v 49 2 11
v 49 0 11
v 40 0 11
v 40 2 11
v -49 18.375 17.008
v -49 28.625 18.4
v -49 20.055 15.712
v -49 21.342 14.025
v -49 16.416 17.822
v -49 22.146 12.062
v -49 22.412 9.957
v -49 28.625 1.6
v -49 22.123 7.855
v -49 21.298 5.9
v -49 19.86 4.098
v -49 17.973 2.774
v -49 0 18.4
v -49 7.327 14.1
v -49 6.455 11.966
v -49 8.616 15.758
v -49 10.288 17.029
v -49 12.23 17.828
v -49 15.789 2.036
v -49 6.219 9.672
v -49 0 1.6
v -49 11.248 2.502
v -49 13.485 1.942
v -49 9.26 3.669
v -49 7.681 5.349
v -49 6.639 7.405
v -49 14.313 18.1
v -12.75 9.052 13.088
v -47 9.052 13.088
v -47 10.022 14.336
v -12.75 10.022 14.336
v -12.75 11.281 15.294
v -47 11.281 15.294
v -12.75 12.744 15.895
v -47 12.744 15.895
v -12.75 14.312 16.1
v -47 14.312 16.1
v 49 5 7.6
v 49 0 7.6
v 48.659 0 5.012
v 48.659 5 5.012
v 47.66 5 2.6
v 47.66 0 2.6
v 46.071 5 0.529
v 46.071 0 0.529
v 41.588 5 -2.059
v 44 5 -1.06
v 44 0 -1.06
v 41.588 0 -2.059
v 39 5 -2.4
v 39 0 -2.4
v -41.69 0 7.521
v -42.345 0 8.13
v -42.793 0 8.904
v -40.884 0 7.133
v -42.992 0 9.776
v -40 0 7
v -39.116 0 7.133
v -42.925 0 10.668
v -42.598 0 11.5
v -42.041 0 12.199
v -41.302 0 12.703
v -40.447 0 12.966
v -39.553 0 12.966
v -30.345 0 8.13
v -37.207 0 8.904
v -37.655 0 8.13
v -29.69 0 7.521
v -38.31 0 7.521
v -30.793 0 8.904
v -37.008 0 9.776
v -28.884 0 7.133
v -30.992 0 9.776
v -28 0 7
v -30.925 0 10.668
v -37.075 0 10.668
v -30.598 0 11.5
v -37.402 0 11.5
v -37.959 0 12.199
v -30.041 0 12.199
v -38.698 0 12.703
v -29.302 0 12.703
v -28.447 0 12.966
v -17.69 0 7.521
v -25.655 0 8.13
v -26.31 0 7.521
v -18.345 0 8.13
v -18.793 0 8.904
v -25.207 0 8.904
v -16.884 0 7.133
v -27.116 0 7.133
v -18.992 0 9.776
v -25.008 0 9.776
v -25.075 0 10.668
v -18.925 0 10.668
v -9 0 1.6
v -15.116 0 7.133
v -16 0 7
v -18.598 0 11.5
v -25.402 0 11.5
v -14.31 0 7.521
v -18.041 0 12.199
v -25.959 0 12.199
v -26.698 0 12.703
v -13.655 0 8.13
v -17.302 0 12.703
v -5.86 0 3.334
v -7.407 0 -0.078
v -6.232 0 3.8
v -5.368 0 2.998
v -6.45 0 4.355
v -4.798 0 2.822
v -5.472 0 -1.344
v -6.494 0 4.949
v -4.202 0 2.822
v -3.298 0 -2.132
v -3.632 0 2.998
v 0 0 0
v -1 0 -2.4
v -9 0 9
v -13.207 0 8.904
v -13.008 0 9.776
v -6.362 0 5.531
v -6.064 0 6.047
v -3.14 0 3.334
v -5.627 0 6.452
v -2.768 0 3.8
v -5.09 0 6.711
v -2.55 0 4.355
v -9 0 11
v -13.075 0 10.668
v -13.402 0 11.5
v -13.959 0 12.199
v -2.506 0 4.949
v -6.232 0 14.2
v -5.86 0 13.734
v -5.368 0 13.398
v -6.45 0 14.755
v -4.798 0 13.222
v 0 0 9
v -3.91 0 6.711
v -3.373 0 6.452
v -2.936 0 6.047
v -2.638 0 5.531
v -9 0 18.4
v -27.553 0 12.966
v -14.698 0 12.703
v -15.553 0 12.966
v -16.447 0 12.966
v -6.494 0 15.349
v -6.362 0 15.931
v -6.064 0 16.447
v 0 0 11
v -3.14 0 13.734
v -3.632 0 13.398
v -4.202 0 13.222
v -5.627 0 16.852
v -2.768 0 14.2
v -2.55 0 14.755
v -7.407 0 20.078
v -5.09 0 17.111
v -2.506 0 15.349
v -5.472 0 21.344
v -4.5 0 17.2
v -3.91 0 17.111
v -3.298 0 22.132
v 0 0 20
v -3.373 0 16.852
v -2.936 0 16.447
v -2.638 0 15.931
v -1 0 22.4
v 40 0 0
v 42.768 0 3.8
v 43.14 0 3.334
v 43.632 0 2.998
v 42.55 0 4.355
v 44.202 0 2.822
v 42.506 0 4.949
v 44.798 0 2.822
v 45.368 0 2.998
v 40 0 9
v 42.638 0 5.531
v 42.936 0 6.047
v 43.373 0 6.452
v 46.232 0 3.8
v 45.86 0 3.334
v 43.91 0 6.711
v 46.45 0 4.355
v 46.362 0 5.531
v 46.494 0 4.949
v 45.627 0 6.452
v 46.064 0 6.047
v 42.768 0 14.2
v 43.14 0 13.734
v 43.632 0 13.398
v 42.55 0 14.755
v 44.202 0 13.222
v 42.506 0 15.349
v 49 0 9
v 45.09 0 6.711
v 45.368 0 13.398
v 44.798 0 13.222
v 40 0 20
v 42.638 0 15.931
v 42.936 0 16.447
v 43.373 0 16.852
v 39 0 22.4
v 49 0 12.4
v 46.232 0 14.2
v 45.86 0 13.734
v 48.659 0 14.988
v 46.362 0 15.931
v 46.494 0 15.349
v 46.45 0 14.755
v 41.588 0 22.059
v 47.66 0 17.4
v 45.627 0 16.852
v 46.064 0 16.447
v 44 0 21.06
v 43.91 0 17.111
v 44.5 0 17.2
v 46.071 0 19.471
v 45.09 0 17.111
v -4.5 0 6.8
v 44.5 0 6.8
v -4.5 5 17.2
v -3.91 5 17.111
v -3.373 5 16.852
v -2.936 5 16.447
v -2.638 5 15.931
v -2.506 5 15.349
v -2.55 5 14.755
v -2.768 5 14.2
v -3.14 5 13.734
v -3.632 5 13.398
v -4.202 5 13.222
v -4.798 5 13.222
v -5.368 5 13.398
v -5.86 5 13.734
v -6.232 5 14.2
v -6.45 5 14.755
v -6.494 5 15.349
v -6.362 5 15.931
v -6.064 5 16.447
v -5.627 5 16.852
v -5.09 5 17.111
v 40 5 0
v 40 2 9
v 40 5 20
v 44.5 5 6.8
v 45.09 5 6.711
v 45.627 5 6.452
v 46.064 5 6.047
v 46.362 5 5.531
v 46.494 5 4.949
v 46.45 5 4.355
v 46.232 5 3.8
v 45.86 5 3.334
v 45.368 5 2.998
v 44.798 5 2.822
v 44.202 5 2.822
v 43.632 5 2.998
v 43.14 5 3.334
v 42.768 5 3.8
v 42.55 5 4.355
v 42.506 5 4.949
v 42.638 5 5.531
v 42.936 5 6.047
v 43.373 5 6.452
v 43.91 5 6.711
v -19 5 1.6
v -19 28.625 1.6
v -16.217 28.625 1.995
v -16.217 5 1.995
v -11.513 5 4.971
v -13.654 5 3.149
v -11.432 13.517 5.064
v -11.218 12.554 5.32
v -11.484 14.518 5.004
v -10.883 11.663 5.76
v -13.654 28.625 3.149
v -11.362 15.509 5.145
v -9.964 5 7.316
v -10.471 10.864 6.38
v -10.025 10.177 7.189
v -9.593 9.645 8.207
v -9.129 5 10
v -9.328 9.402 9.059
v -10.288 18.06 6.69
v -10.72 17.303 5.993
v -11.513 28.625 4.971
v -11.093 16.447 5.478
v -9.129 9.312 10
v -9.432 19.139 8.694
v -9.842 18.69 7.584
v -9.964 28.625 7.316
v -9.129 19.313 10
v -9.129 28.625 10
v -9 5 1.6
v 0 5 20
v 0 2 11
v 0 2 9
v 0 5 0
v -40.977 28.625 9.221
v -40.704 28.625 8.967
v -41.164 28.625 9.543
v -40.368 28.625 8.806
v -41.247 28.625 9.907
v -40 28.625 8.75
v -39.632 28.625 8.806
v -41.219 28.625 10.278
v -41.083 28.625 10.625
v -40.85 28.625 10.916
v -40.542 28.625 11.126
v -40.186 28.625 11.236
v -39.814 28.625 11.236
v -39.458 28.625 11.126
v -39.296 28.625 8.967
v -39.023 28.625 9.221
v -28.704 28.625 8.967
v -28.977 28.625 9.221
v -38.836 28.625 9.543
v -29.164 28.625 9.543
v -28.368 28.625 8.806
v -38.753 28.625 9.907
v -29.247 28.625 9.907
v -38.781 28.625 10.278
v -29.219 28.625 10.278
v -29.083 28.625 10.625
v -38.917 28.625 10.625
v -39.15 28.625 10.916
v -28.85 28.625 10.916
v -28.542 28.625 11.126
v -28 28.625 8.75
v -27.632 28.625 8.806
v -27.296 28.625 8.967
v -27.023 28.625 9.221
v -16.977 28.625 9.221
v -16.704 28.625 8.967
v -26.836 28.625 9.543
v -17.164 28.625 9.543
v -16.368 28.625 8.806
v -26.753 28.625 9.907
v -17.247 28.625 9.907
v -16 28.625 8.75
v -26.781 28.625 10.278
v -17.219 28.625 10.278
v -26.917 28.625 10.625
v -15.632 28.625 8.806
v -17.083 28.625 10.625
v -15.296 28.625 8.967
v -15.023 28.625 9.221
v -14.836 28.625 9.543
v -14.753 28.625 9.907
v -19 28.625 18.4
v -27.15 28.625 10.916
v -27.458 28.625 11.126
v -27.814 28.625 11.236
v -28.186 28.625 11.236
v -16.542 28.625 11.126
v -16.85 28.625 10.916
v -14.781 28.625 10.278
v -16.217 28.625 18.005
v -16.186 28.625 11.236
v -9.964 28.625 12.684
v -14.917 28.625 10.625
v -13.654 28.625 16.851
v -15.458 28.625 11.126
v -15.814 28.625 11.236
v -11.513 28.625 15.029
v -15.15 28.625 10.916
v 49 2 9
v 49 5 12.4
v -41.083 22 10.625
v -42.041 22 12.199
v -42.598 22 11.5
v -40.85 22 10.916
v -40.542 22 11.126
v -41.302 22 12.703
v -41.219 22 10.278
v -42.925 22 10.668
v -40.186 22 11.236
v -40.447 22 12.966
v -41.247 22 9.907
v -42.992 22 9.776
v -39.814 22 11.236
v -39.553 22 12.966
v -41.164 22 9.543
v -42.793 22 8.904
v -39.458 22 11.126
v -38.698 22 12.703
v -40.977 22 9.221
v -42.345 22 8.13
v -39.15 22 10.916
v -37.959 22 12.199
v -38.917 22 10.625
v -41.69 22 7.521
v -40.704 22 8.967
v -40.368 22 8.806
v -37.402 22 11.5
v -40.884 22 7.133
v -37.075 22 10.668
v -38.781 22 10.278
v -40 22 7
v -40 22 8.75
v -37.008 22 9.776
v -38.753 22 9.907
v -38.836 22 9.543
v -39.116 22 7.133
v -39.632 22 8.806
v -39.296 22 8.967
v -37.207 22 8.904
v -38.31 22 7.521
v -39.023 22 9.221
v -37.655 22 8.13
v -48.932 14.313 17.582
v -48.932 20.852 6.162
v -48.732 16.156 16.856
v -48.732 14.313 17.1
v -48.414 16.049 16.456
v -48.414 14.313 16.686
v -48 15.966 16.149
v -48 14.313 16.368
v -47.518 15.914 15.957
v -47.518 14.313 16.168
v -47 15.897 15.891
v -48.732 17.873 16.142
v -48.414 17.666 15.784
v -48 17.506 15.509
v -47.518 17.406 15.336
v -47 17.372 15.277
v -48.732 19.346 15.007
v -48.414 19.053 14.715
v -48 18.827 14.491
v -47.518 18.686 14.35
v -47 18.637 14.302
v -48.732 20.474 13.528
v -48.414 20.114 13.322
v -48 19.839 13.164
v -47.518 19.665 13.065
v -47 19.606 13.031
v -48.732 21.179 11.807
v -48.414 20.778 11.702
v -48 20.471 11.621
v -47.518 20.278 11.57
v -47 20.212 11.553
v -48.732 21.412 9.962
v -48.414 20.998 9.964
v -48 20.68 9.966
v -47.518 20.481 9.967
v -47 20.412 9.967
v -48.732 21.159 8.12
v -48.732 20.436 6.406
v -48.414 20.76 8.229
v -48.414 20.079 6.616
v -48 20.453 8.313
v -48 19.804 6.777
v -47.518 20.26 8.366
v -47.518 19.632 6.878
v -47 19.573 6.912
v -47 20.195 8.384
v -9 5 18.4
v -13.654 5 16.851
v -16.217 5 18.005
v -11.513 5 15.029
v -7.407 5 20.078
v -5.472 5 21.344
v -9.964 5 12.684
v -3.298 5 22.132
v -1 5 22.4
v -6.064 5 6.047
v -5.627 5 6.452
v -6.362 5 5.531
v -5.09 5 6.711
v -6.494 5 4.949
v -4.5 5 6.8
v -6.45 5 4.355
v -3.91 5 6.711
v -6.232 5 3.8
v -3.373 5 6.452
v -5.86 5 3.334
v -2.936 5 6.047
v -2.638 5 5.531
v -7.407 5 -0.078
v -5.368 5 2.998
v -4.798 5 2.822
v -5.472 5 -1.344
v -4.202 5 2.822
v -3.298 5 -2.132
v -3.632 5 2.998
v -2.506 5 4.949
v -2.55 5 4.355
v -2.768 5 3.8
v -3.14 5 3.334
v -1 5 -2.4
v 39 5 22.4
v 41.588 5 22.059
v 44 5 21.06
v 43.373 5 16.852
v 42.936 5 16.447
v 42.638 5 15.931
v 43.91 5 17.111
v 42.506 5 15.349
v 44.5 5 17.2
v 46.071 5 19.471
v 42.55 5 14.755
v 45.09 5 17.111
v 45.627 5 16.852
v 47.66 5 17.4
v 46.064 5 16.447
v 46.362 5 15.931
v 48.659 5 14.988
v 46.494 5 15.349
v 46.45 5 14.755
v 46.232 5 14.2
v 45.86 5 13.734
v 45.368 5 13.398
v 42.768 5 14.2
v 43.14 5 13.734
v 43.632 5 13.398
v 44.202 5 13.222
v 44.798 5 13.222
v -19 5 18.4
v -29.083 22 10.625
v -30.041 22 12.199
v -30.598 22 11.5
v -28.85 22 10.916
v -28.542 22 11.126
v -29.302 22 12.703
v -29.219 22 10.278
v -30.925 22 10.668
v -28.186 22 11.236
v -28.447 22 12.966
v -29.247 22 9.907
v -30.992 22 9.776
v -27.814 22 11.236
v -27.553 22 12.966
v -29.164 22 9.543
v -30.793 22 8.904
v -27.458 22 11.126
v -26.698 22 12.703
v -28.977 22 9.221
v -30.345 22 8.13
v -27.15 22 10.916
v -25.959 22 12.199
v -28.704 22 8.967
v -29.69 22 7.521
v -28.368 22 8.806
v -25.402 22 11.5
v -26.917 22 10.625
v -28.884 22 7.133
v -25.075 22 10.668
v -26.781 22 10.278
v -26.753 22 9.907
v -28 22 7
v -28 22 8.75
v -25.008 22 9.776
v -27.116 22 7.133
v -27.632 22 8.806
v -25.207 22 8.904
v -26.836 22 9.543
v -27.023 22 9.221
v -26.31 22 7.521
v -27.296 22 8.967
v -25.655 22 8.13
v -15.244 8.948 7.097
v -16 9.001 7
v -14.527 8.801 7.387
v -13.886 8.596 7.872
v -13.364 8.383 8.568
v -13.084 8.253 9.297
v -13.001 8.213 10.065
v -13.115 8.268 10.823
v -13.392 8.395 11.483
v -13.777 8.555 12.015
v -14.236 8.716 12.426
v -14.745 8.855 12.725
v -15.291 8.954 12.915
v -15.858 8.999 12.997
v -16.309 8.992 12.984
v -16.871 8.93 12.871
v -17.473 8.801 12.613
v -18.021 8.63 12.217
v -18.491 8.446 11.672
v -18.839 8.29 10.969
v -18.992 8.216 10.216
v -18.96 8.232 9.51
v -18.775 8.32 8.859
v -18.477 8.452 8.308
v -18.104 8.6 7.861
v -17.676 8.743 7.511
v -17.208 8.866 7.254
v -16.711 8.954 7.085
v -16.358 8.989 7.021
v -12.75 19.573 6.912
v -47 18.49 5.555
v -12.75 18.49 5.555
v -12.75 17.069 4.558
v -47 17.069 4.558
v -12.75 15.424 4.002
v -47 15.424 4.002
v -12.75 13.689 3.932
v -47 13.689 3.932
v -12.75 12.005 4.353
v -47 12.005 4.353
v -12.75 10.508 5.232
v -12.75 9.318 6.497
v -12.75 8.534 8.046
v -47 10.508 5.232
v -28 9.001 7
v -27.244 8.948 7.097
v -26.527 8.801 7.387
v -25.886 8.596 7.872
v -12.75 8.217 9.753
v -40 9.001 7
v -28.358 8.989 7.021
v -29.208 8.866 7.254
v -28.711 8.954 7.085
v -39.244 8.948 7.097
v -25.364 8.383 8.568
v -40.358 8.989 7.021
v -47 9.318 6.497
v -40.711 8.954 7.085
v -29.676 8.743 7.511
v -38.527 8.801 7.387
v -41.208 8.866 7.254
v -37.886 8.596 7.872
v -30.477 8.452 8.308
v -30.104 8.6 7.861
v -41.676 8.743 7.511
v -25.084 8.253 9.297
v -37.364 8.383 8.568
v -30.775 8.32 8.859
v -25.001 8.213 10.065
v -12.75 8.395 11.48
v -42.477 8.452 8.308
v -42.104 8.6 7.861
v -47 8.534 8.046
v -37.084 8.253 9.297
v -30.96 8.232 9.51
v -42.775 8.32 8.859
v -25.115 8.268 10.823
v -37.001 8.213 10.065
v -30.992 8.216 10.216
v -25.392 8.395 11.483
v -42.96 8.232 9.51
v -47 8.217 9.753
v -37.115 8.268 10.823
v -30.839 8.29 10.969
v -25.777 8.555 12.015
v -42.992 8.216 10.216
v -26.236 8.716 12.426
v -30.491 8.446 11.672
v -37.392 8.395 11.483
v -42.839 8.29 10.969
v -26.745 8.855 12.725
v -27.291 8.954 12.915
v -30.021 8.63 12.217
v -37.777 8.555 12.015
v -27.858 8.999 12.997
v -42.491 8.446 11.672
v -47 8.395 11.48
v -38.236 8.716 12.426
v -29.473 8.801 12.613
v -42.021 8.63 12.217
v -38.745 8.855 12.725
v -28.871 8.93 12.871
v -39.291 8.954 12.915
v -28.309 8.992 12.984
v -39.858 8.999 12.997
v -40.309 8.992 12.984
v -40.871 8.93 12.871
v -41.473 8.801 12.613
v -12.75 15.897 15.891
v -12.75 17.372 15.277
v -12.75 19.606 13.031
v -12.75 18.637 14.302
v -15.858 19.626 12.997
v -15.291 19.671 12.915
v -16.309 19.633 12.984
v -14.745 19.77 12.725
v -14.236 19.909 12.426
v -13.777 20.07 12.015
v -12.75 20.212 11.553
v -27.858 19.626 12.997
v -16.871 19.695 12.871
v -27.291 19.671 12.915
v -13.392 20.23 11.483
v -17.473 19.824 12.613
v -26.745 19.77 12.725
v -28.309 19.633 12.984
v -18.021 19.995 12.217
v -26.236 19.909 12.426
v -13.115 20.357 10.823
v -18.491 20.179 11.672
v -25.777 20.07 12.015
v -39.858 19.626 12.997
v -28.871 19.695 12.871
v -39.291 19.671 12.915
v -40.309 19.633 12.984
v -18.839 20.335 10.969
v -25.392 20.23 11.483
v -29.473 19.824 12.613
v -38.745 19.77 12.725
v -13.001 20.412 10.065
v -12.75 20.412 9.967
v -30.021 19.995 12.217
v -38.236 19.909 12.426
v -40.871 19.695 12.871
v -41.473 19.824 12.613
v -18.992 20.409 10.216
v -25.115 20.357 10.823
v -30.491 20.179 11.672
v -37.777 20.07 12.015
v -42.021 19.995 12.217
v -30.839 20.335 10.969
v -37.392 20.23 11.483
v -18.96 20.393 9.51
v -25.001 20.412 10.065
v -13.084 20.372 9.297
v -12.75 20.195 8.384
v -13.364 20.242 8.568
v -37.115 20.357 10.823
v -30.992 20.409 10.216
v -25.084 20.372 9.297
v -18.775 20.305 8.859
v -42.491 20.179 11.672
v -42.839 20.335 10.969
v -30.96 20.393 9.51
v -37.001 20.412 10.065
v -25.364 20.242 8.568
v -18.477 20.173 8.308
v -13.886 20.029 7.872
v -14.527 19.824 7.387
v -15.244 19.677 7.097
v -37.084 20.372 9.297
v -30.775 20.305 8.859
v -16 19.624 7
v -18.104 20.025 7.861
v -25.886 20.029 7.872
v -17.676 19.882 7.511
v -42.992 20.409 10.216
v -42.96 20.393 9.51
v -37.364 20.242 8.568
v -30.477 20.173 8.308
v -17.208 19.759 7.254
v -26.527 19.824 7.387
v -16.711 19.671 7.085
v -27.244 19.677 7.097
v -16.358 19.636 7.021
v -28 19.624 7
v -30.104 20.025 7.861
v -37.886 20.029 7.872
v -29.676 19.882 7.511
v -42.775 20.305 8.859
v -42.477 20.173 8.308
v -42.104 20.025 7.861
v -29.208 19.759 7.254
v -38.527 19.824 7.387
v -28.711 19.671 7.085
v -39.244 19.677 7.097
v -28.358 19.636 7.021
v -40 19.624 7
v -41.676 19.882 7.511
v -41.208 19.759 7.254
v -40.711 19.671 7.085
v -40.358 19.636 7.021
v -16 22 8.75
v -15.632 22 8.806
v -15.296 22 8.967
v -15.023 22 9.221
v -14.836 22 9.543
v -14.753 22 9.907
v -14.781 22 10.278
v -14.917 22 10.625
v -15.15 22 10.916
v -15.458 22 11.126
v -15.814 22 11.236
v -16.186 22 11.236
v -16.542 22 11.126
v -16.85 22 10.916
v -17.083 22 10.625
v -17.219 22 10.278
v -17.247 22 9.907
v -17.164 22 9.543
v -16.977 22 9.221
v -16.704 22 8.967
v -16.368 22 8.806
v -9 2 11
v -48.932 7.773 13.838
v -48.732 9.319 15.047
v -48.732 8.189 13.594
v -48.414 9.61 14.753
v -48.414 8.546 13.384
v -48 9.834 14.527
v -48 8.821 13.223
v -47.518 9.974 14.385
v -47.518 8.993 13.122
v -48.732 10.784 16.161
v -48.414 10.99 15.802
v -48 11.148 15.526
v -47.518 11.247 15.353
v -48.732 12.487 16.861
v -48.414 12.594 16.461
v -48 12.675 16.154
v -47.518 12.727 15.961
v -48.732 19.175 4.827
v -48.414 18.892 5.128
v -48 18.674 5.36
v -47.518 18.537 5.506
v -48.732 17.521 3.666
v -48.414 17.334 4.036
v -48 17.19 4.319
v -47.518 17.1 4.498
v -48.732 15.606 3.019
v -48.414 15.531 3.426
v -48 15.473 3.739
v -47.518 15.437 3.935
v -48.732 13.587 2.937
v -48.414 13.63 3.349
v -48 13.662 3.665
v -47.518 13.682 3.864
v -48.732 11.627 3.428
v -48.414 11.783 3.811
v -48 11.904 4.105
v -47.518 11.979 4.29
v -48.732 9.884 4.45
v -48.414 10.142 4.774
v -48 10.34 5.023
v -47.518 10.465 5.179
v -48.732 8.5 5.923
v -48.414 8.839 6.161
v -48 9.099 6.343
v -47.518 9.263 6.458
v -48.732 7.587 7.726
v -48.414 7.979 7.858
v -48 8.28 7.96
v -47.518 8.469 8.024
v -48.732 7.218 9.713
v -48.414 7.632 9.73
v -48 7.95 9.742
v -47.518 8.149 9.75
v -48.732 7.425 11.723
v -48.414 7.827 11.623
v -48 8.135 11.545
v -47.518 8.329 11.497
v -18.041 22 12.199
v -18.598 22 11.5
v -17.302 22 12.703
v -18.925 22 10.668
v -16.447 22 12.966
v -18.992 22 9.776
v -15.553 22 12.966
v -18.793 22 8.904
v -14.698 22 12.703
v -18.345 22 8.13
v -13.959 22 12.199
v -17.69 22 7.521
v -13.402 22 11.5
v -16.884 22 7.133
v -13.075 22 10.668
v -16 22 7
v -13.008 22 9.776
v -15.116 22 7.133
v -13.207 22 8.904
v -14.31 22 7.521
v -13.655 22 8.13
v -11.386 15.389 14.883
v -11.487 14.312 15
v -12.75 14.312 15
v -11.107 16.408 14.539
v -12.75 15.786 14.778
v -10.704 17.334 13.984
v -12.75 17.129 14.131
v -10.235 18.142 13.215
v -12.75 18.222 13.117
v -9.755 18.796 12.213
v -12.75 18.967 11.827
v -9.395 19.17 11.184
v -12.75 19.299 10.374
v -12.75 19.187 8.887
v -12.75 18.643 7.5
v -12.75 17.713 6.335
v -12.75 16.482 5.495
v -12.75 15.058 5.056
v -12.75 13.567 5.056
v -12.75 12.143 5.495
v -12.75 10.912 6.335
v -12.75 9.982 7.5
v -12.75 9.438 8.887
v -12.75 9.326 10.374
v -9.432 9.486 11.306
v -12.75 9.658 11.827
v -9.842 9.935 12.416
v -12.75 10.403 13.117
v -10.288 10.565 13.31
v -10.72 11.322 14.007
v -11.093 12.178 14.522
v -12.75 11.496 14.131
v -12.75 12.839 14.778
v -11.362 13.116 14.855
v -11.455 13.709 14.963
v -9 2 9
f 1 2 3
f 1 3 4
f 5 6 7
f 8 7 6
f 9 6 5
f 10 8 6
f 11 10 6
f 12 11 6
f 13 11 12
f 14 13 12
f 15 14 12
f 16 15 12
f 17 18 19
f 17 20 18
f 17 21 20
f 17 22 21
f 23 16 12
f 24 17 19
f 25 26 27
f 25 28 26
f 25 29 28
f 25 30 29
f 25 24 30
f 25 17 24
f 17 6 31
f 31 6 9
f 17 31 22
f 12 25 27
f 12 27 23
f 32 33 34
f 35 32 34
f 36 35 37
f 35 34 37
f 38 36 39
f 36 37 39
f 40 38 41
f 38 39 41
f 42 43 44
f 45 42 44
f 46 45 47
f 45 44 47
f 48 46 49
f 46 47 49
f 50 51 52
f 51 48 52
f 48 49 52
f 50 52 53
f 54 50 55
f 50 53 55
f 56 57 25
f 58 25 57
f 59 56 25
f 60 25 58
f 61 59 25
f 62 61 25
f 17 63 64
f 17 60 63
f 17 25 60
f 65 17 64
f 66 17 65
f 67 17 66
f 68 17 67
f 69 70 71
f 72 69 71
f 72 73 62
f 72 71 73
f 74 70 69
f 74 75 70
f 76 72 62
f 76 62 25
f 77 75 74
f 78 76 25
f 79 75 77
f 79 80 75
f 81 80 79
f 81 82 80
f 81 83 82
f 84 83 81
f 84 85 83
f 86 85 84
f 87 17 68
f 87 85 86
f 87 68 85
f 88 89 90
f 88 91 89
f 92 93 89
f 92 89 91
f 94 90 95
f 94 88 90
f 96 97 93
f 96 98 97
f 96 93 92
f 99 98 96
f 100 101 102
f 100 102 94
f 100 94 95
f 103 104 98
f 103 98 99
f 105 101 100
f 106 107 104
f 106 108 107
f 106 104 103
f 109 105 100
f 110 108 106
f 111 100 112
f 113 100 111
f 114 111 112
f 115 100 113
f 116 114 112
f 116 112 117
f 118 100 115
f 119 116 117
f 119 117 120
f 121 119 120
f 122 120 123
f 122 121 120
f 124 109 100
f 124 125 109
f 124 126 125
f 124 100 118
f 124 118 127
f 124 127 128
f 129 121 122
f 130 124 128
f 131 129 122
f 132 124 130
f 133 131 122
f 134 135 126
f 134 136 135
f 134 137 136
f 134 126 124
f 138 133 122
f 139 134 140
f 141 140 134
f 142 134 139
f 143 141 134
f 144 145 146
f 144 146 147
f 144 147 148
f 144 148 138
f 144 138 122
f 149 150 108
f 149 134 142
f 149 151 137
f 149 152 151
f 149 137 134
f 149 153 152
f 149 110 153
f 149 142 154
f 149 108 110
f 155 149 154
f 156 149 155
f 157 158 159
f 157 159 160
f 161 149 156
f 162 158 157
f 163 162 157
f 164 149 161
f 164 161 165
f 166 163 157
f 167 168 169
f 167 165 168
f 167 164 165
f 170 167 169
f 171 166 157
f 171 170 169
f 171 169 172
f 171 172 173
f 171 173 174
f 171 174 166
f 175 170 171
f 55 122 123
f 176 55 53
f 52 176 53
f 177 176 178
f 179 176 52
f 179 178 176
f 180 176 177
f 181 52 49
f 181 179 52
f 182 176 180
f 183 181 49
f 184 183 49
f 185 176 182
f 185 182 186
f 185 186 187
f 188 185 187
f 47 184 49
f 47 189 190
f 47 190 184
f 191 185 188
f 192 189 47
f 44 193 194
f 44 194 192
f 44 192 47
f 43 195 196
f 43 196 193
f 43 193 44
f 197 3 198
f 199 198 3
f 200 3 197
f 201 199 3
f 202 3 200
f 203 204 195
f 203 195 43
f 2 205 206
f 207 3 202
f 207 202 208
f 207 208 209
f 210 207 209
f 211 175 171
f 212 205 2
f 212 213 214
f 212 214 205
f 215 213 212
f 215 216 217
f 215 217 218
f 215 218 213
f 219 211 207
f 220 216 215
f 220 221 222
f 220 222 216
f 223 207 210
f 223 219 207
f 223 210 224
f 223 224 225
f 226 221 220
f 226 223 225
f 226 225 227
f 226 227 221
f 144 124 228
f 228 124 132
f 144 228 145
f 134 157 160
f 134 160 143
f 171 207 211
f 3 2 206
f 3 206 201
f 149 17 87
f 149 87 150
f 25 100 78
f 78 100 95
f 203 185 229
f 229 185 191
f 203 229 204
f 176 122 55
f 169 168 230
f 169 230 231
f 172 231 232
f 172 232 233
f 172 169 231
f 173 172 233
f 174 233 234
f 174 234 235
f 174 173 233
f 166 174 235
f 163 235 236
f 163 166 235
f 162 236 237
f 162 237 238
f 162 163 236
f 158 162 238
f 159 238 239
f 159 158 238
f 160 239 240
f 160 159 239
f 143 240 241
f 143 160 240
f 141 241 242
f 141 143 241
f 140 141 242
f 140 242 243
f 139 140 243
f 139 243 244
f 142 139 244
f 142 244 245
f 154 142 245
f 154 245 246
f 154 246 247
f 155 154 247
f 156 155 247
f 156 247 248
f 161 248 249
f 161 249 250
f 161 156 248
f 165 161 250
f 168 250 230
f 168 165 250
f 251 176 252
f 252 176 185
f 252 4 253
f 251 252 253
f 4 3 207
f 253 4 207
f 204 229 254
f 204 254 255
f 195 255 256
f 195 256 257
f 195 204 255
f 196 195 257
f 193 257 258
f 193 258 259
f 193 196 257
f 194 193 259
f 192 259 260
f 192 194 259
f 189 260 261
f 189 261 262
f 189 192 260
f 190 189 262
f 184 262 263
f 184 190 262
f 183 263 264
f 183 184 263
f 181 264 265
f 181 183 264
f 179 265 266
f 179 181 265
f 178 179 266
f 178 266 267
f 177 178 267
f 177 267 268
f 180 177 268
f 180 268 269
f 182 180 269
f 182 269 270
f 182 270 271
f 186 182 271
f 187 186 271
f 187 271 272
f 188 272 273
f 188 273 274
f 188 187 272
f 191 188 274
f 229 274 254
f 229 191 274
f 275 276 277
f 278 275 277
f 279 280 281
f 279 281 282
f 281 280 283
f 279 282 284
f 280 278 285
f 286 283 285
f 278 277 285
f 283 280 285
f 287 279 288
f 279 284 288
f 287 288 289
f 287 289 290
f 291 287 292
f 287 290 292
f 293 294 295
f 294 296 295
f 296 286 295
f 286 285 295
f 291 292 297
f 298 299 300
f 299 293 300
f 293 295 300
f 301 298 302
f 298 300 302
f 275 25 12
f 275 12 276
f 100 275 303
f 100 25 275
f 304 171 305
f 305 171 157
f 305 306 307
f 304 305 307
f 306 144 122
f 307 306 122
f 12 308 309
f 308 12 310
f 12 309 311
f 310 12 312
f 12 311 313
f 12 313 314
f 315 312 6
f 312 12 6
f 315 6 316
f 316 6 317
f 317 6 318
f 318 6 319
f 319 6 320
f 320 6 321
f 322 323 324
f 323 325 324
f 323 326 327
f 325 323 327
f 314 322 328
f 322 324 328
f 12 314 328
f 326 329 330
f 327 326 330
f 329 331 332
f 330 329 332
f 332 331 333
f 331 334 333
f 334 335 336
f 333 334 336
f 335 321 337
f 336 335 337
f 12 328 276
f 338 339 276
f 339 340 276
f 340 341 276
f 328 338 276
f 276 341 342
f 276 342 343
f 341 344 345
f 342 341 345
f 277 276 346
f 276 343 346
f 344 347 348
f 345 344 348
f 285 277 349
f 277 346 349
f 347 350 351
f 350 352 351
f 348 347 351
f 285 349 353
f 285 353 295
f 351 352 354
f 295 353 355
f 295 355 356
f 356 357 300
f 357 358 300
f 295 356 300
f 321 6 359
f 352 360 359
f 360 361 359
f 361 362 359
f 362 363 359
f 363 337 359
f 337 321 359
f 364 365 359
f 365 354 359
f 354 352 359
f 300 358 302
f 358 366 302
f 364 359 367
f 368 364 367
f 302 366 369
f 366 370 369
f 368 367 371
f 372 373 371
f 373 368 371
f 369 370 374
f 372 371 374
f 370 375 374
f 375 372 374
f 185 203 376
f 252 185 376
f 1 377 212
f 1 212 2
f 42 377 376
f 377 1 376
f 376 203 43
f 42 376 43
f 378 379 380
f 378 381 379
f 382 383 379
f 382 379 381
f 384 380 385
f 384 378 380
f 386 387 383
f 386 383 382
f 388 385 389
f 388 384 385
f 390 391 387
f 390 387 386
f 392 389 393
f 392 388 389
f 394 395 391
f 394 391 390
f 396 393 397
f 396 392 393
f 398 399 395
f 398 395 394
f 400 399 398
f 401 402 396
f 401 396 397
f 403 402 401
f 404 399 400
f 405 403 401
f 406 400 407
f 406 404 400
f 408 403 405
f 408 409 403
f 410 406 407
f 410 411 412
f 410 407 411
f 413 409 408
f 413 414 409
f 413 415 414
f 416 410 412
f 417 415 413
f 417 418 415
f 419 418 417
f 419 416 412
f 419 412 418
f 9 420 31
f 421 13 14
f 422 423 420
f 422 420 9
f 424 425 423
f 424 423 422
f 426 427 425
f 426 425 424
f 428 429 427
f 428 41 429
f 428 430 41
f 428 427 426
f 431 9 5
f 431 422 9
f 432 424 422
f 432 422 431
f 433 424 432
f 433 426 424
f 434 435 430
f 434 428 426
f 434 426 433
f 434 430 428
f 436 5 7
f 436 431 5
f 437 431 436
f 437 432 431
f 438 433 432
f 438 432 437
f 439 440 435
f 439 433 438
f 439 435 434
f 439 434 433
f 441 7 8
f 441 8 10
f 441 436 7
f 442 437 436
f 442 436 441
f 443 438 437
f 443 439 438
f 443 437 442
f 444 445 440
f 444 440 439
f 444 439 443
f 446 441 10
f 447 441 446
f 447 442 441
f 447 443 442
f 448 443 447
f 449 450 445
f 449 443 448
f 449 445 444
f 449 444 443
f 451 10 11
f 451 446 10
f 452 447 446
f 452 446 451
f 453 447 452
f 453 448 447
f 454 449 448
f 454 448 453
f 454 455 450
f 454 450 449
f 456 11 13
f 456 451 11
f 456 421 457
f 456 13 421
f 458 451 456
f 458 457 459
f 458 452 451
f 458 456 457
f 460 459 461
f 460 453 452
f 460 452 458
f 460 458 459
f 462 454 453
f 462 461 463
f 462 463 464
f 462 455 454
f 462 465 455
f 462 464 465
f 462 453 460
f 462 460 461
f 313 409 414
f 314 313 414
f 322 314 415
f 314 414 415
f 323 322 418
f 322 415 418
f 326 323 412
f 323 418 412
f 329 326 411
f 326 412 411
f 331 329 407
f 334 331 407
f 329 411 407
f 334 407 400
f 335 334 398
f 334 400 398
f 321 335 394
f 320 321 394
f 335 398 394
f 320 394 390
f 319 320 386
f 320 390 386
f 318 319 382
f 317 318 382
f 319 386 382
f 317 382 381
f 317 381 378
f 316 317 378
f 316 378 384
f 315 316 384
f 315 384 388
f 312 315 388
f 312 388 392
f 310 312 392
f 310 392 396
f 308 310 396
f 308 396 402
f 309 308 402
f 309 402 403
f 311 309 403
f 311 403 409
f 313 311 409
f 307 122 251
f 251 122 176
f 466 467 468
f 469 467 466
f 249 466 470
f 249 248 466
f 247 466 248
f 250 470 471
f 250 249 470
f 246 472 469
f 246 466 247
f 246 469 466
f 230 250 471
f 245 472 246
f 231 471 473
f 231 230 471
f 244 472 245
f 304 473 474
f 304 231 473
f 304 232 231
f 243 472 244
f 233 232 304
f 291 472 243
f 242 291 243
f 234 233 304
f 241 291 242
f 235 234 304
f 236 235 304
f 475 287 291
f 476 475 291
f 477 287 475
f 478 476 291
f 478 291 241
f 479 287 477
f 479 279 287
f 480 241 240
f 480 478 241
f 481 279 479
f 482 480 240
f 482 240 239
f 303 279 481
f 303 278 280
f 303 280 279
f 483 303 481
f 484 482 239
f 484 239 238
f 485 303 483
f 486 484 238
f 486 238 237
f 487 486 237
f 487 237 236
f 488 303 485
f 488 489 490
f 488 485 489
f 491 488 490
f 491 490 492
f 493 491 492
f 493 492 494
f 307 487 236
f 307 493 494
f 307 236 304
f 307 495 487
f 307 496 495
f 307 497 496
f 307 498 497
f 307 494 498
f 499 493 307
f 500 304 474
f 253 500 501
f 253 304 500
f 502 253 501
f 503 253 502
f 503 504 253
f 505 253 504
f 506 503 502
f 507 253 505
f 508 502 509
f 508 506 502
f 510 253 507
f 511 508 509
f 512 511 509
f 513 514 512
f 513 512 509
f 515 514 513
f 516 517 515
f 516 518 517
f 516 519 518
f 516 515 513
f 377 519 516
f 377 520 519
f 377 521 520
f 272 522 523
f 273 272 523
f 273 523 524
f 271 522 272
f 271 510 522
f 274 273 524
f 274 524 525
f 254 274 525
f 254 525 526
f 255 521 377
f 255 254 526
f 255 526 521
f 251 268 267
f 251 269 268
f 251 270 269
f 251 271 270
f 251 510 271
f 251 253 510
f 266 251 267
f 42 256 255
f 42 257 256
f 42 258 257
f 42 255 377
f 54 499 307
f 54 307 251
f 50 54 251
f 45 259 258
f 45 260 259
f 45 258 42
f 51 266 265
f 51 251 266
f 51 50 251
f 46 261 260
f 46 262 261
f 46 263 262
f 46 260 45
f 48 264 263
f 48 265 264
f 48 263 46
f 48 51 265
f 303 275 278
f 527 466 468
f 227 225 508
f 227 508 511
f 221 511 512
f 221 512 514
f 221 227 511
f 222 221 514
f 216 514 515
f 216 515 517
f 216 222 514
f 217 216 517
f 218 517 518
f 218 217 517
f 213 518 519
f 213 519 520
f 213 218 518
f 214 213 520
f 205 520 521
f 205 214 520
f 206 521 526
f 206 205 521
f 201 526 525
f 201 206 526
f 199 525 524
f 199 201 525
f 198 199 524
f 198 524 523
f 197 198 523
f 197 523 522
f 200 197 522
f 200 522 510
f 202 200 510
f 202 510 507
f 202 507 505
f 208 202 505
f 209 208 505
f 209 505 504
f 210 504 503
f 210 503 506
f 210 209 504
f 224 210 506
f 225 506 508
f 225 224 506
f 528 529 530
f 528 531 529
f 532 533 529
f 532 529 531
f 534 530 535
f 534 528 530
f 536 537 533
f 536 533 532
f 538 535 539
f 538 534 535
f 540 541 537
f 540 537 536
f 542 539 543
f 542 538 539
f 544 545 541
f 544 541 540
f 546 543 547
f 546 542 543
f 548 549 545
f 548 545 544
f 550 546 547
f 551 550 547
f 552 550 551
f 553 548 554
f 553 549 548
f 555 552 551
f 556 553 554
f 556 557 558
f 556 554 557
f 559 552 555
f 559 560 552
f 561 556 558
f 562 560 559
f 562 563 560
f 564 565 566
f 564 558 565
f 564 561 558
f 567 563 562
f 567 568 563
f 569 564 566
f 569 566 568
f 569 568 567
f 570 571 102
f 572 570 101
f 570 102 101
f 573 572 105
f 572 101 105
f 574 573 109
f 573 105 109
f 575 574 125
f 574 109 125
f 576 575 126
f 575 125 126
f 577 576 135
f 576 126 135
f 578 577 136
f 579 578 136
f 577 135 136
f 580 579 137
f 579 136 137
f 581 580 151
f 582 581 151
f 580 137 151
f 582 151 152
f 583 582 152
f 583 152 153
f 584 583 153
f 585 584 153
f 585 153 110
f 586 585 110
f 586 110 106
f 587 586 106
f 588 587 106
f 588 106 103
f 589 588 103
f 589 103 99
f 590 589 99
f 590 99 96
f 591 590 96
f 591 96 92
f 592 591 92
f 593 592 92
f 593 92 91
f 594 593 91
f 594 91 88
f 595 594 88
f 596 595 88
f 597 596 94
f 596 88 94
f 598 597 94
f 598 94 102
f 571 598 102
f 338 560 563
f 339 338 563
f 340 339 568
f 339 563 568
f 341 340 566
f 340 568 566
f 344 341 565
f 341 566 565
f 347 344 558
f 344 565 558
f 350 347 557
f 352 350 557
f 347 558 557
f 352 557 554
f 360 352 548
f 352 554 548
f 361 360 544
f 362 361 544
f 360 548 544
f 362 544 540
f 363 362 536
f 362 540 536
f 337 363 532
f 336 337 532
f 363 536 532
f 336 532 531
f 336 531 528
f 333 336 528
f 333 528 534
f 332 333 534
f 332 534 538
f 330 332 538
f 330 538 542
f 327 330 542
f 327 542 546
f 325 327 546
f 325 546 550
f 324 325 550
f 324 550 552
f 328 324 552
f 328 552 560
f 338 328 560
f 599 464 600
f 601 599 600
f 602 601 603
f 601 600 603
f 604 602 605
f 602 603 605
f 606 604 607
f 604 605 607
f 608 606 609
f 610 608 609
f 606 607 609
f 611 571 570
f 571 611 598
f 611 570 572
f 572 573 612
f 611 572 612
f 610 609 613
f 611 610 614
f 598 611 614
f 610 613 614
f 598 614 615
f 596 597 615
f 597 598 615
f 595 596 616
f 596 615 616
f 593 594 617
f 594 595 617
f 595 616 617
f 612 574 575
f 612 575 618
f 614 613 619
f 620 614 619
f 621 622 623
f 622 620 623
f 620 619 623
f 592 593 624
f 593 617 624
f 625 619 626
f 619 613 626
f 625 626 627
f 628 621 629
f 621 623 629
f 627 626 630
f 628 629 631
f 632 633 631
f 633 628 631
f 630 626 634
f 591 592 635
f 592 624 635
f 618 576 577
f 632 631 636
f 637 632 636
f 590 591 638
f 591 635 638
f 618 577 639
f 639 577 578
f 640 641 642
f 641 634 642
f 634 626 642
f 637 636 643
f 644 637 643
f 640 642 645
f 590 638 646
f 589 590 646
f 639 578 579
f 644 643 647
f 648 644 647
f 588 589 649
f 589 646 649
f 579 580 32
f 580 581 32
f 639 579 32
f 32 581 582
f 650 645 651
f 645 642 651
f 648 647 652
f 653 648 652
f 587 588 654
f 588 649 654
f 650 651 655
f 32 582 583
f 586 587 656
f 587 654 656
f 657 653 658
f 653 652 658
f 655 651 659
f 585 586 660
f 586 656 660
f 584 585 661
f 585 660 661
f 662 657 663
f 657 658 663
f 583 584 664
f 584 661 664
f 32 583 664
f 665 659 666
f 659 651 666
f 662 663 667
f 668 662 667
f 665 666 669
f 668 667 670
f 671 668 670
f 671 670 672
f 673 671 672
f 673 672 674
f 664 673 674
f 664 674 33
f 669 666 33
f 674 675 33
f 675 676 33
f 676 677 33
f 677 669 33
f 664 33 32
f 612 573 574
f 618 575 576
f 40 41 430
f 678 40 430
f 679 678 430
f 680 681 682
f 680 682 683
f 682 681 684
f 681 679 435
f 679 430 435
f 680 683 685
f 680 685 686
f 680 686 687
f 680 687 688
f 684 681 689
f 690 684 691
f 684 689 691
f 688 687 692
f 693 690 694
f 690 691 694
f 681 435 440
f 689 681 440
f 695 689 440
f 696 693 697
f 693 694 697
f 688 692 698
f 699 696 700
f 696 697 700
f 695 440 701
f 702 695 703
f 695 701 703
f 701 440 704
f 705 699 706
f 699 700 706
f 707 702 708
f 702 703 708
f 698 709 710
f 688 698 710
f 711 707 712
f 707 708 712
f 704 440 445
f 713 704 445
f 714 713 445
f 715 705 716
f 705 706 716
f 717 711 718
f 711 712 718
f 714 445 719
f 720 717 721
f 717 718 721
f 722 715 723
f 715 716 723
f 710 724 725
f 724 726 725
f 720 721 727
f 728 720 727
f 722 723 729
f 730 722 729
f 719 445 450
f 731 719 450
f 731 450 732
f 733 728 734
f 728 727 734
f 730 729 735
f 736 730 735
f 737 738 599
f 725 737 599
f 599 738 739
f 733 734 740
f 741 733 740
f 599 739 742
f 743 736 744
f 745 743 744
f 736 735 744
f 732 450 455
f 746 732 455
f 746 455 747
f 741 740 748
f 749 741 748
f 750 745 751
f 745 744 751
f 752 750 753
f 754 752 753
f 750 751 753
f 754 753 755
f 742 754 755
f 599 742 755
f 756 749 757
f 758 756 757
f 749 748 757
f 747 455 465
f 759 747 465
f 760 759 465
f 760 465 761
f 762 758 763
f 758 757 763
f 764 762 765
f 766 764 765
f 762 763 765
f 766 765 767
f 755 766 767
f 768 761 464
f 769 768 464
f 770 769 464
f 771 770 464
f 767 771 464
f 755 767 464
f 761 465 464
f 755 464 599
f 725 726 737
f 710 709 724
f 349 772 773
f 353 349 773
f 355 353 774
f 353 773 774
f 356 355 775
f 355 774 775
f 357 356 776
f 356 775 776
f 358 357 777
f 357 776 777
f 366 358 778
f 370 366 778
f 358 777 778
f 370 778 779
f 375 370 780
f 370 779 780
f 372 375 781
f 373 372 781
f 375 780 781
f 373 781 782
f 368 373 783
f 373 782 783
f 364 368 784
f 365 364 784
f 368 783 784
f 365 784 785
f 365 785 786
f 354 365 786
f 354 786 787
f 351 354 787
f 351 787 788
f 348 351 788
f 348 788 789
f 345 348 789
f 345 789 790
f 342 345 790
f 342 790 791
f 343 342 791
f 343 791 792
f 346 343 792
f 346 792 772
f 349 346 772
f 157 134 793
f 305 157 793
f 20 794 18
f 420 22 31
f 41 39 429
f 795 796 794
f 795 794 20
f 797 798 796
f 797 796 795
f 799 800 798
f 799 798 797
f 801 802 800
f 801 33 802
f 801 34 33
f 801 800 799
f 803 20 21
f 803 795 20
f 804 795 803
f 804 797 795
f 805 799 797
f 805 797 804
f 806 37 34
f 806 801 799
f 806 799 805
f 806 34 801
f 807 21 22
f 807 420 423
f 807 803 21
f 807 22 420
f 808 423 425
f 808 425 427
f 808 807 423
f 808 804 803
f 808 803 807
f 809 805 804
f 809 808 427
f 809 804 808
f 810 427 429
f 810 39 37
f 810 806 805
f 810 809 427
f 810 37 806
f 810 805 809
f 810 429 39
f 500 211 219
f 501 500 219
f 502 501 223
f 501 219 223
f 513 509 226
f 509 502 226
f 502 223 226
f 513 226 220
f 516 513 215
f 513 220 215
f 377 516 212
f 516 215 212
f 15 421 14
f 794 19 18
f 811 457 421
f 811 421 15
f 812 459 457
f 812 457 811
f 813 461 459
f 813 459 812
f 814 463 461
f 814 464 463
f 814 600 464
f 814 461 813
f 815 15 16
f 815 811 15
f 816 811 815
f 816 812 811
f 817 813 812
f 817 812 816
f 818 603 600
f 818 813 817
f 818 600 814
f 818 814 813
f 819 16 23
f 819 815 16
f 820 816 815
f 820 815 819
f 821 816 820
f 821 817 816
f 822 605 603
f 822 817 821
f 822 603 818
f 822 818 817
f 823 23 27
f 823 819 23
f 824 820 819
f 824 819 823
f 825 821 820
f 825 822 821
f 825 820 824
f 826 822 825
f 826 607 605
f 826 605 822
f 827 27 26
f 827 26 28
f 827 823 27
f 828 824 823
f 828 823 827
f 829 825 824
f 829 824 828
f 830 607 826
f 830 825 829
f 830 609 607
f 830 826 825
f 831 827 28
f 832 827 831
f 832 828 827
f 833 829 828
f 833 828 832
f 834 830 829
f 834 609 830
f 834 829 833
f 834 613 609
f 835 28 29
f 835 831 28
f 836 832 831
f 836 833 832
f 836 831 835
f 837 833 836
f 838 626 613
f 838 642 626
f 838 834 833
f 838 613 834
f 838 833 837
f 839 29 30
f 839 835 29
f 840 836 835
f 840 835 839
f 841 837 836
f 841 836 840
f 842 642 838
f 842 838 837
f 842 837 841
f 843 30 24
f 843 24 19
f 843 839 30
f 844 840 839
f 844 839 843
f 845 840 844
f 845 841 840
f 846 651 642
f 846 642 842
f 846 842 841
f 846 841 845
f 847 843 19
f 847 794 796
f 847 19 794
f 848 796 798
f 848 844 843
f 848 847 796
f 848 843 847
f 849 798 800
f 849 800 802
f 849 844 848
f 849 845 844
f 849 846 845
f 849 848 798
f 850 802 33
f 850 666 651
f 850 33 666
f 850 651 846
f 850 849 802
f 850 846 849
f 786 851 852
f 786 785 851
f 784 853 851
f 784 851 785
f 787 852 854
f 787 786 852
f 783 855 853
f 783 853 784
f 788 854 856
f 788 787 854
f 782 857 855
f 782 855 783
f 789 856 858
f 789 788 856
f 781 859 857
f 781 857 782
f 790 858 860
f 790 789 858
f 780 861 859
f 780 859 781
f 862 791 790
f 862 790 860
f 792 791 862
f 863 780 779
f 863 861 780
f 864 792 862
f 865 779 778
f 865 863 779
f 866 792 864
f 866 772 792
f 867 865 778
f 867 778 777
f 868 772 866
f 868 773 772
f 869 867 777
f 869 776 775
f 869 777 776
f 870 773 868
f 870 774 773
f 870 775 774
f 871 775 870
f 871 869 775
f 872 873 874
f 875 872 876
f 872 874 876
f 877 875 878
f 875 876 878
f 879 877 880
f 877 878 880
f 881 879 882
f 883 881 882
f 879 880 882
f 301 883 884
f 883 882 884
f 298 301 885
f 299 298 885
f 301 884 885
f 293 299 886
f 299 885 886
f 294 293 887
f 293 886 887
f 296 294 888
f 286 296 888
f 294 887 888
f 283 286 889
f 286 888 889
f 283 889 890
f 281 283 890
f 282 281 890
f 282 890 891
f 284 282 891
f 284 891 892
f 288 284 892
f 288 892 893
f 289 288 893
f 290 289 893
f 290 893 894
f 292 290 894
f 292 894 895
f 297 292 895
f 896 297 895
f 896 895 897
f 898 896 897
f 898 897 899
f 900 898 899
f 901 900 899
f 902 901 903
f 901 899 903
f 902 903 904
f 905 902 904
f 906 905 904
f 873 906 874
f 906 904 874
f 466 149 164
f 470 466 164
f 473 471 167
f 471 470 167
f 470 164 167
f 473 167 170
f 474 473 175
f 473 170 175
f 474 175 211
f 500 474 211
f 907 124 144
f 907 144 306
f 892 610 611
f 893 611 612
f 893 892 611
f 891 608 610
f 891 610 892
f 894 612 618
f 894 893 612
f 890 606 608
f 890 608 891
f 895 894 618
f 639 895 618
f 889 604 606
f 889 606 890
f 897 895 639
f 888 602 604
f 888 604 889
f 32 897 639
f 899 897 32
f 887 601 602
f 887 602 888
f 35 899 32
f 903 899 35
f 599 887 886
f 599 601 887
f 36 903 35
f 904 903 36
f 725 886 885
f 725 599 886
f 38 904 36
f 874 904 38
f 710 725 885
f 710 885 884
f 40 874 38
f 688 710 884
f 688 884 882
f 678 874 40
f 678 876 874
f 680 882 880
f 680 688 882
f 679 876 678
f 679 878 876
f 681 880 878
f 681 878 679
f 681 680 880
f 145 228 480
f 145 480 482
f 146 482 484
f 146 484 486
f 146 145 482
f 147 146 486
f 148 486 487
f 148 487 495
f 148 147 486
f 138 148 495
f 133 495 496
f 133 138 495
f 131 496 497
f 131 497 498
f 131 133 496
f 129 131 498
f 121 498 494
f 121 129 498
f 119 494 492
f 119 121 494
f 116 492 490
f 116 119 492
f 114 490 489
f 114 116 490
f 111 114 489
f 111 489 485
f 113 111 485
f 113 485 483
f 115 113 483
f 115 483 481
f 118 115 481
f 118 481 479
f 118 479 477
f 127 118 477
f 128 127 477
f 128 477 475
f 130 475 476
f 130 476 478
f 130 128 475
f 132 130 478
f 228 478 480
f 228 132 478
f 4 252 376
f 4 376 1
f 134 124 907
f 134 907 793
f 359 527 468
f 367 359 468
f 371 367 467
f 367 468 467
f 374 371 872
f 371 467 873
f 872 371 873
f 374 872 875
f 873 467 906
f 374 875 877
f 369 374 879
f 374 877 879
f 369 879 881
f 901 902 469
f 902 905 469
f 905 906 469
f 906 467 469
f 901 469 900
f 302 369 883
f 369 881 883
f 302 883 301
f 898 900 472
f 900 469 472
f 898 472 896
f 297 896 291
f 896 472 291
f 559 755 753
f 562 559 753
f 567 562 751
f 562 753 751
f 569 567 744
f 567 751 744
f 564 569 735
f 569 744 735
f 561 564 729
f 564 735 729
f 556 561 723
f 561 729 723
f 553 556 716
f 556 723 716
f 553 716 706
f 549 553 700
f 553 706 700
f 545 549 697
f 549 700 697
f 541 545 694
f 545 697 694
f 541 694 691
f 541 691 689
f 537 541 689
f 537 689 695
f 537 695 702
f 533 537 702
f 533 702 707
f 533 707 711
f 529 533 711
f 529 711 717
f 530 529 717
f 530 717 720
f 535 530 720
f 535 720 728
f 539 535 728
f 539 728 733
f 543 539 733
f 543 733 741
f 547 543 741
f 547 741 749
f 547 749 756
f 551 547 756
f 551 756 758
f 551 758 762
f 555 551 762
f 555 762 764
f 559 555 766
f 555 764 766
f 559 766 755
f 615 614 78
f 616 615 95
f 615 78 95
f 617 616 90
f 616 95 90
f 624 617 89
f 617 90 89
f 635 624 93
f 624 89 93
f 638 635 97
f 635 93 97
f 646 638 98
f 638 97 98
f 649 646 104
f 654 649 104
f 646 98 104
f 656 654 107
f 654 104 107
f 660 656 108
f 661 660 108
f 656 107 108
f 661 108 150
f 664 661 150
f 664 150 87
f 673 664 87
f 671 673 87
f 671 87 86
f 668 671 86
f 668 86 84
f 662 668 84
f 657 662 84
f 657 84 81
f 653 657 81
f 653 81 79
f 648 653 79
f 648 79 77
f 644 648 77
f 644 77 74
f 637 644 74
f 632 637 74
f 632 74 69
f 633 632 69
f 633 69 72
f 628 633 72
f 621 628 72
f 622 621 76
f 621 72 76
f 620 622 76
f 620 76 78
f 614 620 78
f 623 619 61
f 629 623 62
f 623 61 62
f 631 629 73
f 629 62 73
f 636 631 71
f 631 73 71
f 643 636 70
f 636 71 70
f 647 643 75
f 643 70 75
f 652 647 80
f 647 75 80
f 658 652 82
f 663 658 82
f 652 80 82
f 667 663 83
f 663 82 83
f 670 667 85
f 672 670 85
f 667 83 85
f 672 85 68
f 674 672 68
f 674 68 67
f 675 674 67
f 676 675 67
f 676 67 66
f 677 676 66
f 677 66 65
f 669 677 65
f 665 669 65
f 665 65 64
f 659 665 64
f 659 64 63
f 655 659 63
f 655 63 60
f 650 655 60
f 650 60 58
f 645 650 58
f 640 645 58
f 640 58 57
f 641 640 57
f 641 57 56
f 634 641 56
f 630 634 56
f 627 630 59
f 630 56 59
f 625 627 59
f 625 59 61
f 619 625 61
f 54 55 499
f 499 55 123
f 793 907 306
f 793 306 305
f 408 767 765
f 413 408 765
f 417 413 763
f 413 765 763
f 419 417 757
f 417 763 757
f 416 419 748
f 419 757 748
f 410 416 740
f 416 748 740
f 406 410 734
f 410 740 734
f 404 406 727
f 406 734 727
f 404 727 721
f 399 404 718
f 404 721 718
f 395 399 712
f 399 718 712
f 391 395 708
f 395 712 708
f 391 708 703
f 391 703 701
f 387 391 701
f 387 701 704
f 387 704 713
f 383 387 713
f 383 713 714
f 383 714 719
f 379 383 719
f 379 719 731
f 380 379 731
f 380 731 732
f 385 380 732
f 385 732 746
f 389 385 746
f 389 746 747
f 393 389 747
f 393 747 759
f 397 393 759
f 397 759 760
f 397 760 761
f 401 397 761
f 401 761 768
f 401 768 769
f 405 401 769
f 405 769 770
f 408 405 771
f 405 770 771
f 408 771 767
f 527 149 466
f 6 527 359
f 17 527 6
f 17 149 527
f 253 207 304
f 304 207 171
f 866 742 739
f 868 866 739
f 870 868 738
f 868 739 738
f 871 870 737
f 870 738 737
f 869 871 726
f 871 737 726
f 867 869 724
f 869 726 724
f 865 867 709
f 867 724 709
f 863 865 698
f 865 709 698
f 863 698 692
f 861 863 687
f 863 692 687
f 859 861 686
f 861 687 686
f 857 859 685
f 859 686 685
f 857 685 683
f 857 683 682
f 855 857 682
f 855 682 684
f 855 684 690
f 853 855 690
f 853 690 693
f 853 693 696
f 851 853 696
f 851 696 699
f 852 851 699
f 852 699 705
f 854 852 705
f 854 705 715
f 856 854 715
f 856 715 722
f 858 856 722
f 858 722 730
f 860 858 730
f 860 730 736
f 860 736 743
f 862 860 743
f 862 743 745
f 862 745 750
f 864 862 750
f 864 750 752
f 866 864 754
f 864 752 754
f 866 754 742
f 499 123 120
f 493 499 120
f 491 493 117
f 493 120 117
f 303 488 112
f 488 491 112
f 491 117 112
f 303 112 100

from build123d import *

# Parameters (mm, degrees)
SKETCH1_R           = 2
BOSS_EXTRUDE1_DEPTH = 5
SKETCH2_W           = 2
SKETCH2_H           = 4
CUT_EXTRUDE1_DEPTH  = 63.375956906
BOSS_EXTRUDE2_DEPTH = 28.625
FILLET1_R           = 10
CUT_EXTRUDE2_DEPTH  = 36.25
CUT_EXTRUDE3_REACH  = 73.653
SKETCH5_R           = 5
FILLET4_R           = 10
SKETCH8_R           = 3
CUT_EXTRUDE6_DEPTH  = 22
SKETCH9_R           = 1.25
CUT_EXTRUDE7_DEPTH  = 59.195876265
FILLET5_R           = 2


with BuildPart() as part:
    # Sketch1 → Boss-Extrude1 (new body)
    with BuildSketch(Plane(origin=(0, 0, 0), x_dir=(1, 0, 0), z_dir=(0, 1, 0))):
        Polygon((-9, 2.4), (-9, 0), (-9, -22.4), (49, -22.4), (49, 2.4), align=None)
        with Locations(Location((-4.5, -15.2, 0), (0, 0, 270))):
            Circle(SKETCH1_R, mode=Mode.SUBTRACT)
        with Locations(Location((44.5, -15.2, 0), (0, 0, 270))):
            Circle(SKETCH1_R, mode=Mode.SUBTRACT)
        with Locations(Location((-4.5, -4.8, 0), (0, 0, 270))):
            Circle(SKETCH1_R, mode=Mode.SUBTRACT)
        Polygon((0, -4.8), (0, 0), (20, 0), (40, 0), (40, -10), (40, -20), (20, -20), (0, -20), (0, -10), align=None, mode=Mode.SUBTRACT)
        with Locations(Location((44.5, -4.8, 0), (0, 0, 270))):
            Circle(SKETCH1_R, mode=Mode.SUBTRACT)
    extrude(amount=BOSS_EXTRUDE1_DEPTH)

    # Sketch2 → Cut-Extrude1 (cut, through all)
    with BuildSketch(Plane.ZY.offset(9)):
        with Locations((10, 0)):
            Rectangle(SKETCH2_W, SKETCH2_H)
    extrude(amount=-CUT_EXTRUDE1_DEPTH, mode=Mode.SUBTRACT)

    # Sketch3 → Boss-Extrude2 (add)
    with BuildSketch(Plane.XZ):
        Polygon((-9, 1.6), (-9, 10), (-9, 11), (-9, 18.4), (-49, 18.4), (-49, 1.6), align=None)
    extrude(amount=-BOSS_EXTRUDE2_DEPTH)

    # Fillet1
    # the kernel refuses this fillet: 10 mm, written as the material it takes off along each edge
    with BuildSketch(Plane(origin=(-9, -20, 22.4), x_dir=(0, 0, -1), z_dir=(0, 1, 0))) as fillet1_piece_1:
        with BuildLine():
            CenterArc((10, -8), FILLET1_R, 126.869897646, 53.130102354)
            Line((0, -8), (-0.2, -8))
            Line((-0.2, -8), (-0.2, 0))
            Line((-0.2, 0), (0, 0.2))
            ThreePointArc((0, 0.2), (2, 0.2), (3.88, 0.16))
            Line((3.88, 0.16), (4, 0))
        make_face()
    extrude(amount=45, mode=Mode.SUBTRACT)
    with BuildSketch(Plane(origin=(-9, -20, -2.4), x_dir=(0, 0, 1), z_dir=(0, 1, 0))) as fillet1_piece_2:
        with BuildLine():
            CenterArc((10, 8), FILLET1_R, 180, 53.130102354)
            Line((0, 8), (-0.2, 8))
            Line((-0.2, 8), (-0.2, 0))
            Line((-0.2, 0), (0, -0.2))
            ThreePointArc((0, -0.2), (2, -0.2), (3.88, -0.16))
            Line((3.88, -0.16), (4, 0))
        make_face()
    extrude(amount=45, mode=Mode.SUBTRACT)
    with BuildSketch(Plane(origin=(49, -25, -2.4), x_dir=(-1, 0, 0), z_dir=(0, 1, 0)), Plane(origin=(49, -25, 22.4), x_dir=(0, 0, -1), z_dir=(0, 1, 0))) as fillet1_piece_3:
        with BuildLine():
            CenterArc((FILLET1_R, FILLET1_R), FILLET1_R, 180, 90)
            Line((0, FILLET1_R), (-FILLET1_R * 0.02, FILLET1_R))
            Line((-FILLET1_R * 0.02, FILLET1_R), (-FILLET1_R * 0.02, -FILLET1_R * 0.02))
            Line((-FILLET1_R * 0.02, -FILLET1_R * 0.02), (FILLET1_R, -FILLET1_R * 0.02))
            Line((FILLET1_R, -FILLET1_R * 0.02), (FILLET1_R, 0))
        make_face()
    extrude(amount=55, mode=Mode.SUBTRACT)

    # Sketch4 → Cut-Extrude2 (cut)
    with BuildSketch(Plane.ZY.offset(49)):
        with BuildLine():
            ThreePointArc((16.1, 14.3125), (13.031141398, 19.606098193), (6.912399402, 19.573367091))
            Line((6.912399402, 19.573367091), (13.087600598, 9.051632909))
            ThreePointArc((13.087600598, 9.051632909), (15.293598193, 11.281358602), (16.1, 14.3125))
        make_face()
        with BuildLine():
            Line((13.087600598, 9.051632909), (6.912399402, 19.573367091))
            ThreePointArc((6.912399402, 19.573367091), (4.739132909, 11.224899402), (13.087600598, 9.051632909))
        make_face()
    extrude(amount=-CUT_EXTRUDE2_DEPTH, mode=Mode.SUBTRACT)

    # Sketch5 → Cut-Extrude3 (cut, up to next)
    with BuildSketch(Plane.ZY.offset(12.75), mode=Mode.PRIVATE) as cut_extrude3_sk1:
        with Locations((10, 14.3125)):
            Circle(SKETCH5_R)
    cut_extrude3_tool1 = extrude(cut_extrude3_sk1.sketch, amount=-CUT_EXTRUDE3_REACH, mode=Mode.PRIVATE) & part.part
    add(cut_extrude3_tool1.solids().sort_by_distance((-12.75, 14.3125, 10))[0], mode=Mode.SUBTRACT)

    # Fillet4
    # the kernel refuses this fillet: 10 mm, written as the material it takes off along each edge
    with BuildSketch(Plane(origin=(-9, 53.625, 1.6), x_dir=(-1, 0, 0), z_dir=(0, -1, 0))) as fillet4_piece_1:
        with BuildLine():
            CenterArc((FILLET4_R, -FILLET4_R), FILLET4_R, 90, 90)
            Line((0, -FILLET4_R), (0, 0))
            Line((0, 0), (FILLET4_R, 0))
        make_face()
    extrude(amount=48.625, mode=Mode.SUBTRACT)
    with BuildSketch(Plane(origin=(-9, 5, 18.4), x_dir=(0, 0, -1), z_dir=(0, 1, 0))) as fillet4_piece_2:
        with BuildLine():
            CenterArc((FILLET4_R, FILLET4_R), FILLET4_R, 180, 90)
            Line((0, FILLET4_R), (0, 0))
            Line((0, 0), (FILLET4_R, 0))
        make_face()
    extrude(amount=48.625, mode=Mode.SUBTRACT)

    # Sketch8 → Cut-Extrude6 (cut)
    with BuildSketch(Plane.XZ):
        with Locations(Location((-40, 10, 0), (0, 0, 270))):
            Circle(SKETCH8_R)
        with Locations(Location((-28, 10, 0), (0, 0, 270))):
            Circle(SKETCH8_R)
        with Locations(Location((-16, 10, 0), (0, 0, 270))):
            Circle(SKETCH8_R)
    extrude(amount=-CUT_EXTRUDE6_DEPTH, mode=Mode.SUBTRACT)

    # Sketch9 → Cut-Extrude7 (cut, through all)
    with BuildSketch(Plane.XZ.offset(-22)):
        with Locations(Location((-40, 10, 0), (0, 0, 270))):
            Circle(SKETCH9_R)
        with Locations(Location((-28, 10, 0), (0, 0, 270))):
            Circle(SKETCH9_R)
        with Locations(Location((-16, 10, 0), (0, 0, 270))):
            Circle(SKETCH9_R)
    extrude(amount=-CUT_EXTRUDE7_DEPTH, mode=Mode.SUBTRACT)

    # Fillet5
    fillet5_edges = [part.edges().sort_by_distance(p)[0] for p in [
        (-49, 9.051632909, 13.087600598),
    ]]
    fillet(fillet5_edges, radius=FILLET5_R)


solid = part.part
